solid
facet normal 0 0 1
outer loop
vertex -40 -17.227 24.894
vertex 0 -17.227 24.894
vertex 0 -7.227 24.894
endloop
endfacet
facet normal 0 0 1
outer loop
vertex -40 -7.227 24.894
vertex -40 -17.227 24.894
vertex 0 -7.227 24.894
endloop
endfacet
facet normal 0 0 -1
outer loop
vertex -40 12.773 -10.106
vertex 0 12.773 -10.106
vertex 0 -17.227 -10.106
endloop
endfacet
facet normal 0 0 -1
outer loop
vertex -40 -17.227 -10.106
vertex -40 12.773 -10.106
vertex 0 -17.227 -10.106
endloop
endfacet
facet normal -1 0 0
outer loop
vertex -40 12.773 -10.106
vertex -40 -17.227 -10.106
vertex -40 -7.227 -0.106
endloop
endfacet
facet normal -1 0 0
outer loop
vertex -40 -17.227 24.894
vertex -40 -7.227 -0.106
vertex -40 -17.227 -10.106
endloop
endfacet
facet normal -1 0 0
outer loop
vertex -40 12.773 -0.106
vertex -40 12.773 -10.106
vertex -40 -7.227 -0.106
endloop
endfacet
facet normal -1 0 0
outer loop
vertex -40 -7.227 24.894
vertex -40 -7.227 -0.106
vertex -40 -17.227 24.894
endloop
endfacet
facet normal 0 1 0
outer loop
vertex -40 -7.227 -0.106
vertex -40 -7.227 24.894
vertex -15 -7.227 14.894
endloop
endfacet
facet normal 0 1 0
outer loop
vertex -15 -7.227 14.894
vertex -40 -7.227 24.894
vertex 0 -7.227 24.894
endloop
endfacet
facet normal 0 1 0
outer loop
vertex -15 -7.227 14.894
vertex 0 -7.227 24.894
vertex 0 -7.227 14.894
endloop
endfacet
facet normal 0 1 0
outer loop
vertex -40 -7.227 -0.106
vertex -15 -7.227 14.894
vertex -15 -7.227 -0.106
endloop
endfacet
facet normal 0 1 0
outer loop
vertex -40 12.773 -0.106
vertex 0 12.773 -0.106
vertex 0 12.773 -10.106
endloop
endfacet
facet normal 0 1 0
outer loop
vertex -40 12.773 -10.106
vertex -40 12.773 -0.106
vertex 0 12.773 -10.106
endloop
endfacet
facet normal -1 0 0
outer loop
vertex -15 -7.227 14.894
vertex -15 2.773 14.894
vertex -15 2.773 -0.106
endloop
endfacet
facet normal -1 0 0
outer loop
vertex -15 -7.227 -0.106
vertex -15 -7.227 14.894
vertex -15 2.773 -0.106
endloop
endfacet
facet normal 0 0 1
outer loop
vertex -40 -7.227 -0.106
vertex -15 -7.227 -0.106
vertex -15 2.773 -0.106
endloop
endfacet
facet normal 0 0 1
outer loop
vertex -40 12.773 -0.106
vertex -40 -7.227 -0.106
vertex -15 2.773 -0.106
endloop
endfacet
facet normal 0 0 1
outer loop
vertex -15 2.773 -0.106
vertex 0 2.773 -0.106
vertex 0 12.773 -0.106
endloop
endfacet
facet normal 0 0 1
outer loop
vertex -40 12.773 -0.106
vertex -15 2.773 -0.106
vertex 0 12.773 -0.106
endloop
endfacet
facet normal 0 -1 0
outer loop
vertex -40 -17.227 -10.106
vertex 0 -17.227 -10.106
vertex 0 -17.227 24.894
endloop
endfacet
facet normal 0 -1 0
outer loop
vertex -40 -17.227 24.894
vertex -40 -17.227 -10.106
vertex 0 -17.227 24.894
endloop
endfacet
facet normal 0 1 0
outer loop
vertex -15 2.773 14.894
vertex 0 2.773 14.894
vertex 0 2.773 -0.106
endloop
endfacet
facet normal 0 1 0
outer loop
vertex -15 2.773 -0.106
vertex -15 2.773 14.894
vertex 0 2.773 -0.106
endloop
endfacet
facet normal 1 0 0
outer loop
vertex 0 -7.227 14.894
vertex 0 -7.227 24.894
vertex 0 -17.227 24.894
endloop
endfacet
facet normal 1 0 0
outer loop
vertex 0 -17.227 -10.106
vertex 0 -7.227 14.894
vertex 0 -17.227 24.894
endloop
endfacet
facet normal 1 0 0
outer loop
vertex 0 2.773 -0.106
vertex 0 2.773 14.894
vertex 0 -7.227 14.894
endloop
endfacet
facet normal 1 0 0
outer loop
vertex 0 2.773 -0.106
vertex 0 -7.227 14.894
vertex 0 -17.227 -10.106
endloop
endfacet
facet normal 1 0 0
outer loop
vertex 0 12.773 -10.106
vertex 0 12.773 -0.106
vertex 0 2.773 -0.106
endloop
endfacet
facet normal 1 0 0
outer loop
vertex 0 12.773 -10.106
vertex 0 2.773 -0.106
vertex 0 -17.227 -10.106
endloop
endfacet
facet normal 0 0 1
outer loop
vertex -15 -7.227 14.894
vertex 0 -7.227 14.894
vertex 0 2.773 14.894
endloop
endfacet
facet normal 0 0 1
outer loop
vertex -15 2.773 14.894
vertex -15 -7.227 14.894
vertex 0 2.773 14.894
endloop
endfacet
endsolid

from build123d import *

# Parameters (mm, degrees)
BOSS_EXTRUDE1_DEPTH = 40
SKETCH2_W           = 15
SKETCH2_H           = 10
BOSS_EXTRUDE2_DEPTH = 15


with BuildPart() as part:
    # Sketch1 → Boss-Extrude1 (new body)
    with BuildSketch(Plane(origin=(0, 0, 0), x_dir=(0, 0, -1), z_dir=(1, 0, 0))):
        Polygon((10.105951264, 12.773109244), (10.105951264, -17.226890756), (-24.894048736, -17.226890756), (-24.894048736, -7.226890756), (0.105951264, -7.226890756), (0.105951264, 12.773109244), align=None)
    extrude(amount=-BOSS_EXTRUDE1_DEPTH)

    # Sketch2 → Boss-Extrude2 (add)
    with BuildSketch(Plane(origin=(0, 0, 0), x_dir=(0, 0, -1), z_dir=(1, 0, 0))):
        with Locations((-7.394048736, -2.226890756)):
            Rectangle(SKETCH2_W, SKETCH2_H)
    extrude(amount=-BOSS_EXTRUDE2_DEPTH)


solid = part.part
